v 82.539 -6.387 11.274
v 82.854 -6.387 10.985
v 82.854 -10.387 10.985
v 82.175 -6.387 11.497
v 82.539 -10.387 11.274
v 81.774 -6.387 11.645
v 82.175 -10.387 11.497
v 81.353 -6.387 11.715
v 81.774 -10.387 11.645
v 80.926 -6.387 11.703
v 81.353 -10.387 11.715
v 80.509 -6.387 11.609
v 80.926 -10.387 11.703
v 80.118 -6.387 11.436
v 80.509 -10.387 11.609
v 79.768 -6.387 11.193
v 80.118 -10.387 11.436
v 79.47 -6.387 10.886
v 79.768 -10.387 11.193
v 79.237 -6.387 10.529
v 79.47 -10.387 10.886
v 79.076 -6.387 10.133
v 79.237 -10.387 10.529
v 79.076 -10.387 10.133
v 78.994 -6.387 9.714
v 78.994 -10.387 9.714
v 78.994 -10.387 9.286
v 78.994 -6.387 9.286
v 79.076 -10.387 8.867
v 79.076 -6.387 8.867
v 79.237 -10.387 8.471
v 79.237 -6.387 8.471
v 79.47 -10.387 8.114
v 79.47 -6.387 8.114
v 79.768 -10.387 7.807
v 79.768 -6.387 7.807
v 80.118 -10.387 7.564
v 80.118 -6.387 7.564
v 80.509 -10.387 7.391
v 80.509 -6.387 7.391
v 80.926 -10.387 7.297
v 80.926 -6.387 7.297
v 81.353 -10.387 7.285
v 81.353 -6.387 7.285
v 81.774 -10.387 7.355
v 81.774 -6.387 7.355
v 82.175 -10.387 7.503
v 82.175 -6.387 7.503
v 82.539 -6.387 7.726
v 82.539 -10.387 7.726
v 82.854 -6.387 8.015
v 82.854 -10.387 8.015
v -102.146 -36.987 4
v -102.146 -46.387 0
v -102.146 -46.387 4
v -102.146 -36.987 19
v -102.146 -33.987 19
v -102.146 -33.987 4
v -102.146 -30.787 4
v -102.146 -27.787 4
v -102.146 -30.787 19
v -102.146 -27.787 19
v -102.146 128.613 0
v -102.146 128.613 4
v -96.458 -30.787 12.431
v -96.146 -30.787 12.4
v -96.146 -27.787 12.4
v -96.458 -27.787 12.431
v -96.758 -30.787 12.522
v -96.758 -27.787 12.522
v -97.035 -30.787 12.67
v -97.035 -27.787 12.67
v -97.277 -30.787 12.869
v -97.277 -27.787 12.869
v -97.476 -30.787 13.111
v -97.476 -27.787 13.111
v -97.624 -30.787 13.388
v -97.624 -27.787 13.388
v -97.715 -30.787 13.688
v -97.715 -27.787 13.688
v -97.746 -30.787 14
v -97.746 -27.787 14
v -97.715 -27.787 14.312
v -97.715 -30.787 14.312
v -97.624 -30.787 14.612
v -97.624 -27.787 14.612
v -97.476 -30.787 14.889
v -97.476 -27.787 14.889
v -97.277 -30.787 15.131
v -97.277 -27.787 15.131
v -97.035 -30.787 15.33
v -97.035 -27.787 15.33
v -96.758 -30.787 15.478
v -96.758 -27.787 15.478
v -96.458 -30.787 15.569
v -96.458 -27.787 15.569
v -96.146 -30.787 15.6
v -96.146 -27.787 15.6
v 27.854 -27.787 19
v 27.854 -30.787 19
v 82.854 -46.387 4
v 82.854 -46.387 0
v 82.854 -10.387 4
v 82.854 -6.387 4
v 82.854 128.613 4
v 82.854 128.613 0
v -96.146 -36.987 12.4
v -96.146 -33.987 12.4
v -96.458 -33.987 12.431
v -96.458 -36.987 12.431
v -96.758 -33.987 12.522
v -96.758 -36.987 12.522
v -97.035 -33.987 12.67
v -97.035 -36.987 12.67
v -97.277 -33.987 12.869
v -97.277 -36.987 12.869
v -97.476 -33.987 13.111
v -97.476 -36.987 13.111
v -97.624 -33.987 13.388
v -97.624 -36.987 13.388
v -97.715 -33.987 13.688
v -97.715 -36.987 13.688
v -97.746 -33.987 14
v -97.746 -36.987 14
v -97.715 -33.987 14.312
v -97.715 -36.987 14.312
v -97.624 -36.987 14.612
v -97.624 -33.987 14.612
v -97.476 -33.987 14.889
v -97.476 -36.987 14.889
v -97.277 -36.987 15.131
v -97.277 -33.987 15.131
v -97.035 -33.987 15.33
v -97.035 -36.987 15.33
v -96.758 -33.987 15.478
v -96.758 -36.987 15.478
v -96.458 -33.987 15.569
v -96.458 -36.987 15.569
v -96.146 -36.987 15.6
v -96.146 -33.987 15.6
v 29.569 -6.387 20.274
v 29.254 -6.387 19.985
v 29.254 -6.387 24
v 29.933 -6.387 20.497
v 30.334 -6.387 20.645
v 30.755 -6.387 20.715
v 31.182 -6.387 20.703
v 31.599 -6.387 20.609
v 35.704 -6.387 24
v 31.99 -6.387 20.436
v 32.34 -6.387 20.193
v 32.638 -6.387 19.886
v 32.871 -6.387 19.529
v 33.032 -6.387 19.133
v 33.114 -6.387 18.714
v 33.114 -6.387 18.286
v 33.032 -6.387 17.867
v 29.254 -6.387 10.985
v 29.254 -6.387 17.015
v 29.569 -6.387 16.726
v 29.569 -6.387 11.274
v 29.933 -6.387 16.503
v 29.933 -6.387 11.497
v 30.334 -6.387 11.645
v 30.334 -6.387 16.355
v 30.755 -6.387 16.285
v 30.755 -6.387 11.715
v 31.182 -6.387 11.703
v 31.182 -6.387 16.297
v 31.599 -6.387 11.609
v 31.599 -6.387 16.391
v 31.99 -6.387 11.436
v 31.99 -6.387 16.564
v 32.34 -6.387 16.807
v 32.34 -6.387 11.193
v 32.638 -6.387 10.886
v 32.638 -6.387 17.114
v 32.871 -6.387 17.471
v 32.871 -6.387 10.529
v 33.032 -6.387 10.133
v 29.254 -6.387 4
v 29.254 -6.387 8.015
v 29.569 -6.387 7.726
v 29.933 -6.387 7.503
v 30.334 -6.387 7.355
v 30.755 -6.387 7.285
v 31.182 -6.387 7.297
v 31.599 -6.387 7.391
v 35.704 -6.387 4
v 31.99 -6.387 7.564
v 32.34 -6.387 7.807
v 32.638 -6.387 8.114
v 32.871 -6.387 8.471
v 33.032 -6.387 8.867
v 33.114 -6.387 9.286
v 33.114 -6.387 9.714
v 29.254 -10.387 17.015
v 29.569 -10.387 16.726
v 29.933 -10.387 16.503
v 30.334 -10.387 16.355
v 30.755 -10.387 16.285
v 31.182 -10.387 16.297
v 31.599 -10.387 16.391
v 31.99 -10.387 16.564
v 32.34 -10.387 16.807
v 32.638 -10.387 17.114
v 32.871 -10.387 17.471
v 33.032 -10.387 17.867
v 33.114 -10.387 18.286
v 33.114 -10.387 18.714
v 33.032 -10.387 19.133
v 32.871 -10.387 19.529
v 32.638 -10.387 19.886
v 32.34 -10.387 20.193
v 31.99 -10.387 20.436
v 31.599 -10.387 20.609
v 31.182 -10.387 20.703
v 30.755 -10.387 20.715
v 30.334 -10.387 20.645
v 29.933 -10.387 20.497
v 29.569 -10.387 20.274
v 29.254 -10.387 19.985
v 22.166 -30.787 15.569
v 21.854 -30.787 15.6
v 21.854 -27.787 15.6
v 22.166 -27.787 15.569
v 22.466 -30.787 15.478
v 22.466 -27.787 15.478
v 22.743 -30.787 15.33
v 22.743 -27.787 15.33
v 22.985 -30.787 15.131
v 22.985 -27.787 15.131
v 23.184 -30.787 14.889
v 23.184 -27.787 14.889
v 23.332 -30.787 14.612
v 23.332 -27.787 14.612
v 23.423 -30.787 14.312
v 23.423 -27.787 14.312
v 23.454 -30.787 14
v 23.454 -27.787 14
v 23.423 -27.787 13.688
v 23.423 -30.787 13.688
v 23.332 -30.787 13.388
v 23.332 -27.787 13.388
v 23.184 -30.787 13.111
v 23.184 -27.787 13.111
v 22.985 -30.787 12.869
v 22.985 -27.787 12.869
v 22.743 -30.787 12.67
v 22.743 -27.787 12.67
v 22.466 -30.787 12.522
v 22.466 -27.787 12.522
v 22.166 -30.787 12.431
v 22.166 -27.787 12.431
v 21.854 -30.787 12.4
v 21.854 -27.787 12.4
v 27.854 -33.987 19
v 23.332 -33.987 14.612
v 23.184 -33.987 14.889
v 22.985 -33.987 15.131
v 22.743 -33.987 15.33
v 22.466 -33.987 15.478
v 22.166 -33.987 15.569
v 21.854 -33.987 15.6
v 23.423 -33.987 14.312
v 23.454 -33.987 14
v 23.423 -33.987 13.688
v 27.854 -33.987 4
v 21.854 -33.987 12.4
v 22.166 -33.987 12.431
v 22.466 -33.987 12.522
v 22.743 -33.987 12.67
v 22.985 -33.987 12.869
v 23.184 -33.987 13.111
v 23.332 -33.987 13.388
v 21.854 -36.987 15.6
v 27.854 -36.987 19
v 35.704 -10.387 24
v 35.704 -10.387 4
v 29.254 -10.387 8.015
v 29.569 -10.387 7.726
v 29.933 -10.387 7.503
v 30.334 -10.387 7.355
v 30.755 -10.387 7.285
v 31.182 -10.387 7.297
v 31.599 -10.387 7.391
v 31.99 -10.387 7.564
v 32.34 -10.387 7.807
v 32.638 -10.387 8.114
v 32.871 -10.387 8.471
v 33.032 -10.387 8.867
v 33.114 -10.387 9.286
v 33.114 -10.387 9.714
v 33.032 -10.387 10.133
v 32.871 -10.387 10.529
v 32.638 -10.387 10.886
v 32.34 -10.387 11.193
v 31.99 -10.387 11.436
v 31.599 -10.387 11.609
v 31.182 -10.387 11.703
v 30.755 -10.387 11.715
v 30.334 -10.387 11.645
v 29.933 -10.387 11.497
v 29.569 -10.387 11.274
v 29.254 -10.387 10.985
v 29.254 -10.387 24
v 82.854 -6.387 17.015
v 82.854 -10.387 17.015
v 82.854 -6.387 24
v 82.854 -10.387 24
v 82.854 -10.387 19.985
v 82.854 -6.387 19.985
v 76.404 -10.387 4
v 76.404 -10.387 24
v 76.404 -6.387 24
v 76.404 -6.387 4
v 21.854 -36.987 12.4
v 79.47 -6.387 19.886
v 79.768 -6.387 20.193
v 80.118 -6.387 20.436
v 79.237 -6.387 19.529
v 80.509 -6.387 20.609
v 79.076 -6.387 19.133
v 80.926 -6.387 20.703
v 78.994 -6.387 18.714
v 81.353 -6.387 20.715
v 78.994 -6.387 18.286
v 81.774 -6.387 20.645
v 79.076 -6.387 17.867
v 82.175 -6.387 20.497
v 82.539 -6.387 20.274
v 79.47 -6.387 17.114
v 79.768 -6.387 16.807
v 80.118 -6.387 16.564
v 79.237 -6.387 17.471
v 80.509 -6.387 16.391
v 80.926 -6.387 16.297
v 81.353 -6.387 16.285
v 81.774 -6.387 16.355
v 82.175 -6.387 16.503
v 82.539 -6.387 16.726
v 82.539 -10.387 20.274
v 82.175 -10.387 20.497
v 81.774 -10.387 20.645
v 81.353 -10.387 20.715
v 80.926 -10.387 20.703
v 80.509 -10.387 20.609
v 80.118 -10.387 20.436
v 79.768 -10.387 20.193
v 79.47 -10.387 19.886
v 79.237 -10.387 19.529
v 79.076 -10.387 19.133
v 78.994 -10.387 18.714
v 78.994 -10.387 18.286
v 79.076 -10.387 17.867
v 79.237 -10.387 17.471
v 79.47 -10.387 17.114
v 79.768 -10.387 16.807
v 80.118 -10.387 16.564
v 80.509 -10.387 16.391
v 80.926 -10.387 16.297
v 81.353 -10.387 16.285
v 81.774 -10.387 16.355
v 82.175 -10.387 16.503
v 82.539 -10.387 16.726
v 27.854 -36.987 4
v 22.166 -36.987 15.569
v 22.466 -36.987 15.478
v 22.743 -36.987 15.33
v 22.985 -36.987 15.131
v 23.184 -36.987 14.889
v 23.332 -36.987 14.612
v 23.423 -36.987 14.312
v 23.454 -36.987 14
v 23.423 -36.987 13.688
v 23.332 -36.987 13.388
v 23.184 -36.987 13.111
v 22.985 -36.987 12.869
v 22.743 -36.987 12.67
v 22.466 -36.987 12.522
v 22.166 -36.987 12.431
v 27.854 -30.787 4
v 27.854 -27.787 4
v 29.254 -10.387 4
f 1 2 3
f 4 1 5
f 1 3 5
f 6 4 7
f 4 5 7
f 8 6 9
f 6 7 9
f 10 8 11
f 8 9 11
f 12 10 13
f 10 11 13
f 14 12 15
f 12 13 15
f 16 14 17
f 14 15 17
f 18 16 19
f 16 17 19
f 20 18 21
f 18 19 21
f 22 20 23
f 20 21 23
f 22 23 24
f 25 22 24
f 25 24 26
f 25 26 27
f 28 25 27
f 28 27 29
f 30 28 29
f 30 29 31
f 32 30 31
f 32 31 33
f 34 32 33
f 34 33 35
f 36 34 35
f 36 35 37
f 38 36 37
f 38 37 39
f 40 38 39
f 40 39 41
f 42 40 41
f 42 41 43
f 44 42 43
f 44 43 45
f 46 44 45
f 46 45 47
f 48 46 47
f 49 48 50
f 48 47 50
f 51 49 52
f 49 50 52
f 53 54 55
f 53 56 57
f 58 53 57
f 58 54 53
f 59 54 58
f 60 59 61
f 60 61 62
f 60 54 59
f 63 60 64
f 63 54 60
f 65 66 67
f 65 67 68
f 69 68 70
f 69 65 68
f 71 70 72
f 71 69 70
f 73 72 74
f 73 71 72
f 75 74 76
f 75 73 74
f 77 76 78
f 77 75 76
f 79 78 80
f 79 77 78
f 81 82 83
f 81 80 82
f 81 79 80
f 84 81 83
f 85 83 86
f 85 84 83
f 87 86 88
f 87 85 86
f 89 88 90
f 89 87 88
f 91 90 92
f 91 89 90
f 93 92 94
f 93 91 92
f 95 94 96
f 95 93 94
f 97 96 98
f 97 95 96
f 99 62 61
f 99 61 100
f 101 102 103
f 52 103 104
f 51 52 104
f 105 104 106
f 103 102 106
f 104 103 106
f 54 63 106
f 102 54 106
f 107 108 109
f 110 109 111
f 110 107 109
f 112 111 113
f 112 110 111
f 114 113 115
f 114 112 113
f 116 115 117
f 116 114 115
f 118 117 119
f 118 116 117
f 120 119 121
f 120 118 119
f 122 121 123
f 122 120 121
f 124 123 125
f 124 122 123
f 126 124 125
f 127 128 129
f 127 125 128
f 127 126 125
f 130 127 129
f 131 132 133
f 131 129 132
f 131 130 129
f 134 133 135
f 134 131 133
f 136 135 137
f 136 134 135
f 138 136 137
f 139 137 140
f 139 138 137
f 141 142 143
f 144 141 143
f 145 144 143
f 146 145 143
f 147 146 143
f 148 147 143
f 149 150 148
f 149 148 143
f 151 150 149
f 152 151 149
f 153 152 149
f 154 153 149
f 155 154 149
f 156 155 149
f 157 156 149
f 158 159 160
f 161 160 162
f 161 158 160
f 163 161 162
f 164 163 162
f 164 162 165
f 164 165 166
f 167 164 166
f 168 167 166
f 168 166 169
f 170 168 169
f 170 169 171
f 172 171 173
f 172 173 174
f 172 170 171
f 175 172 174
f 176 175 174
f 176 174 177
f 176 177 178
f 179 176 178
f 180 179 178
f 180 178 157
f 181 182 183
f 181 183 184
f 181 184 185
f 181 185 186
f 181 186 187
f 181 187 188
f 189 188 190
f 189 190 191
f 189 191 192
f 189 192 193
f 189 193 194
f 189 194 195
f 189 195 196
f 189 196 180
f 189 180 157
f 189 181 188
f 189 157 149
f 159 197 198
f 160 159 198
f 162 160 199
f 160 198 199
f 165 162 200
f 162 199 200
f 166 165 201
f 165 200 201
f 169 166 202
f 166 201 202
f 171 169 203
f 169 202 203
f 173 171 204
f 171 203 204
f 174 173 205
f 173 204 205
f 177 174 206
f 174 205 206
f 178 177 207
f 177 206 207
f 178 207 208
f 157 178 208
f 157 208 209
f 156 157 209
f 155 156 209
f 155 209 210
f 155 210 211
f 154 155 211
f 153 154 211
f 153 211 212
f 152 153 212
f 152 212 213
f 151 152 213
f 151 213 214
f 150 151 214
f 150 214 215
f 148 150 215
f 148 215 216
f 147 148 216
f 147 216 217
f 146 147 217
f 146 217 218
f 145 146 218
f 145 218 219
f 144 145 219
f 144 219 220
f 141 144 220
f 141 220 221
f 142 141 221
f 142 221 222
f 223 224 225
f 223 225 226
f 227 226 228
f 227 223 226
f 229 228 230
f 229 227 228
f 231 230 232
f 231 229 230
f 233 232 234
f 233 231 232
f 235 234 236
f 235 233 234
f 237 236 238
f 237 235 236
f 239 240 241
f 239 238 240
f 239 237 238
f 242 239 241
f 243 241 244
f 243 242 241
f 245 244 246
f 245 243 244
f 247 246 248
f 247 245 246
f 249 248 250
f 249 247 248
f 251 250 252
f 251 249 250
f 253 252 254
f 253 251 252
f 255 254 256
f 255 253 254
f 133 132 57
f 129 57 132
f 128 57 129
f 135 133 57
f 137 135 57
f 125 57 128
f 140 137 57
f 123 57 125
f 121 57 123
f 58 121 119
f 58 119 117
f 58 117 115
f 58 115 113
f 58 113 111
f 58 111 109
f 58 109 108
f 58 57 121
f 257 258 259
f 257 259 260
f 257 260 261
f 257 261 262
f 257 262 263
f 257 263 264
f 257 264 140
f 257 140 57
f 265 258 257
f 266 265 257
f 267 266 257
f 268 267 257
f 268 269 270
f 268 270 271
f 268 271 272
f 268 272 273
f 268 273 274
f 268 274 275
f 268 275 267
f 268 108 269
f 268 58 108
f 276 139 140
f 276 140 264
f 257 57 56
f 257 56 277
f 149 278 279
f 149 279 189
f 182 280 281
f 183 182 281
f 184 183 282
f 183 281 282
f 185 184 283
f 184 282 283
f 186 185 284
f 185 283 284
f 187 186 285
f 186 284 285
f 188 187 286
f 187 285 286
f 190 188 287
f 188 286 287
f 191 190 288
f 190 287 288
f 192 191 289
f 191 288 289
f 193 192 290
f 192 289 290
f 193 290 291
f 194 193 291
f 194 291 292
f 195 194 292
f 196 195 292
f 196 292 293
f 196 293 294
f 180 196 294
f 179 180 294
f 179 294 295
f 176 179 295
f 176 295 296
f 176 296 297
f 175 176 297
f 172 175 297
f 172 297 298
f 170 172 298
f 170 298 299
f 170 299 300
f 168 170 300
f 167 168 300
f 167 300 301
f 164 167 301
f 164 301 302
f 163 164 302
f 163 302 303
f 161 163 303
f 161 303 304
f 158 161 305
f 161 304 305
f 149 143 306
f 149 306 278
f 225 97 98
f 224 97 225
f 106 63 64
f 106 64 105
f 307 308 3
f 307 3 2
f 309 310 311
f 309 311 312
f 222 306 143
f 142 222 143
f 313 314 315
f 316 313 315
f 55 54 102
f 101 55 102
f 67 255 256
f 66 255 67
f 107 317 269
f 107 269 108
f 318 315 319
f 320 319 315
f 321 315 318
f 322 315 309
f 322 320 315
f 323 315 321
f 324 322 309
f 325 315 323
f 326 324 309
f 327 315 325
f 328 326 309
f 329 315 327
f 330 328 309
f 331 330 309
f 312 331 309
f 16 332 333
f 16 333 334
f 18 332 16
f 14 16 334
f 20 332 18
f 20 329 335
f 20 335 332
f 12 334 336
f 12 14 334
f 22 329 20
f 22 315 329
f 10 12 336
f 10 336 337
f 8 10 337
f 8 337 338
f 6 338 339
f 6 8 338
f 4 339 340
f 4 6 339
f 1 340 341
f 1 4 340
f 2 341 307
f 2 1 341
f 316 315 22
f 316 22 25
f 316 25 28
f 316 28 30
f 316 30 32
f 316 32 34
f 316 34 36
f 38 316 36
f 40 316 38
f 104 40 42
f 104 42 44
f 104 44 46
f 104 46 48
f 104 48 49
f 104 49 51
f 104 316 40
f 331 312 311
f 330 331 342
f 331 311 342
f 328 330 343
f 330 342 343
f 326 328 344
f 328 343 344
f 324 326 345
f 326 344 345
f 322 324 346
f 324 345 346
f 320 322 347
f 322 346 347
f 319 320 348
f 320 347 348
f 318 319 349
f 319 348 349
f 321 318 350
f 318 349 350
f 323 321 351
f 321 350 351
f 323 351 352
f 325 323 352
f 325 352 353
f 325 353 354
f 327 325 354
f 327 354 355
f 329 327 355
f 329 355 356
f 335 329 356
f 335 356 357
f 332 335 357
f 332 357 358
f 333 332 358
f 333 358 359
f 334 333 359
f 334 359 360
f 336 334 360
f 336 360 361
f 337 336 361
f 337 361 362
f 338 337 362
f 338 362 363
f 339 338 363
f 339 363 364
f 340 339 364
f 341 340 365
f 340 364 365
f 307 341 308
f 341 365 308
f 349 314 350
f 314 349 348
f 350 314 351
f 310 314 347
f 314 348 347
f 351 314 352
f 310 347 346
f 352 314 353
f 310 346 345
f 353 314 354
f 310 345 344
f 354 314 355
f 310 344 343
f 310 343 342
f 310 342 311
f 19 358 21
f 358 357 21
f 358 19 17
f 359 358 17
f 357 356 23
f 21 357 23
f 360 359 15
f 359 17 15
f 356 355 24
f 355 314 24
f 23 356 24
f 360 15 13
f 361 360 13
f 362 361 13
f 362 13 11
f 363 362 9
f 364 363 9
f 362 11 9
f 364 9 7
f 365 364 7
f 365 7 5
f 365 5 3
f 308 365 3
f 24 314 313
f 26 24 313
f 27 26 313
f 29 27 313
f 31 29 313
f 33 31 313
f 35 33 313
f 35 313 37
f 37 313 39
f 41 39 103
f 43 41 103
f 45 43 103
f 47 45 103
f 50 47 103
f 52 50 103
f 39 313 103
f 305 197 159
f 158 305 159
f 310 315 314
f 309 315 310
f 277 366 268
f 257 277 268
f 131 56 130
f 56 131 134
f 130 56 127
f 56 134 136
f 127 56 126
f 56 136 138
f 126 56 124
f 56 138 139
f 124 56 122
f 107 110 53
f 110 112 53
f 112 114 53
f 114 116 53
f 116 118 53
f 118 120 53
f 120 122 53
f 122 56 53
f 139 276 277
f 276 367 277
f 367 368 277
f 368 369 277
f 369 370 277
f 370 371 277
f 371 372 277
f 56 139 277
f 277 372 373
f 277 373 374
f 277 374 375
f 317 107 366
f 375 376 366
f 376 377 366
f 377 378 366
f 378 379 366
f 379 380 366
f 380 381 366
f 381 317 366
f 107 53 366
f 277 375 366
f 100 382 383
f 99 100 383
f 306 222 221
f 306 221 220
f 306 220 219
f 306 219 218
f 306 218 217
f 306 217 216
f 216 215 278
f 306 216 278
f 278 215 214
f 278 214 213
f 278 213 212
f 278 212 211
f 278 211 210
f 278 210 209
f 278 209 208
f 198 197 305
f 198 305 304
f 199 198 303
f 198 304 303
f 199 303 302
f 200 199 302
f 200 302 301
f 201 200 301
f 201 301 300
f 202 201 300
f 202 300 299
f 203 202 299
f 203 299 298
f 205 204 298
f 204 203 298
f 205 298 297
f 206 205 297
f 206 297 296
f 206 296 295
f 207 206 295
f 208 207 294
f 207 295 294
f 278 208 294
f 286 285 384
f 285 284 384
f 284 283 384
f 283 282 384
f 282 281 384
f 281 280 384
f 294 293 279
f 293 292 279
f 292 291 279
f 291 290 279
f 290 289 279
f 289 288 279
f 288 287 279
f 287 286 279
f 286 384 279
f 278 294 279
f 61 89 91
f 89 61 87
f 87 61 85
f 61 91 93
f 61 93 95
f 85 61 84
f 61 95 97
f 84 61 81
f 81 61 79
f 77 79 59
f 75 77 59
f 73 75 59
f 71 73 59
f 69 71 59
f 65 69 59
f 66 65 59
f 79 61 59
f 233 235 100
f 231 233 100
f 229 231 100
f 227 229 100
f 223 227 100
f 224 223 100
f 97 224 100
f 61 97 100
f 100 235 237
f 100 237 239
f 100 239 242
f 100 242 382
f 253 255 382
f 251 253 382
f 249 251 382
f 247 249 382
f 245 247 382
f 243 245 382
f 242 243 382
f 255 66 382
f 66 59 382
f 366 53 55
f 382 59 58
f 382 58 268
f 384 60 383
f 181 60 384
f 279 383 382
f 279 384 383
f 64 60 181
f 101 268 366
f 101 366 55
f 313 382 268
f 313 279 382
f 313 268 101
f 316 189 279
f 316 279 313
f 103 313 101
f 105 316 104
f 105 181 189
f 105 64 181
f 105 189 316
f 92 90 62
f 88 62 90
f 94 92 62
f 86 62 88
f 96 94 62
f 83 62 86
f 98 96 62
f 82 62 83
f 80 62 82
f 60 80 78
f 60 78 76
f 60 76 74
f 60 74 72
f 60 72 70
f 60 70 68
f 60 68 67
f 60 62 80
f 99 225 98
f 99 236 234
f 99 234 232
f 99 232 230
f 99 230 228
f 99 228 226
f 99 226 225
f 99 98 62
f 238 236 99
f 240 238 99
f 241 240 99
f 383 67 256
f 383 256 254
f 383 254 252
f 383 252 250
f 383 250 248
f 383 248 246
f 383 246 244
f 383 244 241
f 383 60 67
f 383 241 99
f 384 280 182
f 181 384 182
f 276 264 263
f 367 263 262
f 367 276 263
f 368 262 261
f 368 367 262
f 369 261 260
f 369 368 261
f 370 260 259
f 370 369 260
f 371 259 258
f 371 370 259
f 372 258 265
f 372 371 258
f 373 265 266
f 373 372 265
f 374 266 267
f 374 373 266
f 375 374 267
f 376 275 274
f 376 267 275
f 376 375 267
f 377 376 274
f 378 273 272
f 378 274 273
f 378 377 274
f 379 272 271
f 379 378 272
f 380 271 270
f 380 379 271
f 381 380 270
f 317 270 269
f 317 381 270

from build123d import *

# Parameters (mm, degrees)
SKETCH_1_W          = 185
SKETCH_1_H          = 175
EXTRUDE_1_DEPTH     = 4
SKETCH_2_W          = 6.45
SKETCH_2_H          = 4
EXTRUDE_2_DEPTH     = 20
CUT_EXTRUDE_1_REACH = 176.157
SKETCH_3_R          = 2.22
SKETCH_4_W          = 130
SKETCH_4_H          = 3
EXTRUDE_3_DEPTH     = 15
CUT_EXTRUDE_2_REACH = 198.044


with BuildPart() as part:
    # 草圖1 → 填料-伸長1 (new body)
    with BuildSketch(Plane.XY):
        with Locations((-9.645986095, 41.11316568)):
            Rectangle(SKETCH_1_W, SKETCH_1_H)
    extrude(amount=EXTRUDE_1_DEPTH)

    # 草圖2 → 填料-伸長2 (add)
    with BuildSketch(Plane.XY.offset(4)):
        with Locations((79.629013905, -8.38683432)):
            Rectangle(SKETCH_2_W, SKETCH_2_H)
        with Locations((32.479013905, -8.38683432)):
            Rectangle(SKETCH_2_W, SKETCH_2_H)
    extrude(amount=EXTRUDE_2_DEPTH)

    # 草圖3 → 除料-伸長1 (cut, up to next)
    with BuildSketch(Plane.XZ.offset(10.38683432), mode=Mode.PRIVATE) as cut_extrude_1_sk1:
        with Locations((81.204013905, 18.5)):
            Circle(SKETCH_3_R)
    cut_extrude_1_tool1 = extrude(cut_extrude_1_sk1.sketch, amount=-CUT_EXTRUDE_1_REACH, mode=Mode.PRIVATE) & part.part
    # 草圖3 → 除料-伸長1 (cut, up to next)
    with BuildSketch(Plane.XZ.offset(10.38683432), mode=Mode.PRIVATE) as cut_extrude_1_sk2:
        with Locations((81.204013905, 9.5)):
            Circle(SKETCH_3_R)
    cut_extrude_1_tool2 = extrude(cut_extrude_1_sk2.sketch, amount=-CUT_EXTRUDE_1_REACH, mode=Mode.PRIVATE) & part.part
    # 草圖3 → 除料-伸長1 (cut, up to next)
    with BuildSketch(Plane.XZ.offset(10.38683432), mode=Mode.PRIVATE) as cut_extrude_1_sk3:
        with Locations((30.904013905, 9.5)):
            Circle(SKETCH_3_R)
    cut_extrude_1_tool3 = extrude(cut_extrude_1_sk3.sketch, amount=-CUT_EXTRUDE_1_REACH, mode=Mode.PRIVATE) & part.part
    # 草圖3 → 除料-伸長1 (cut, up to next)
    with BuildSketch(Plane.XZ.offset(10.38683432), mode=Mode.PRIVATE) as cut_extrude_1_sk4:
        with Locations((30.904013905, 18.5)):
            Circle(SKETCH_3_R)
    cut_extrude_1_tool4 = extrude(cut_extrude_1_sk4.sketch, amount=-CUT_EXTRUDE_1_REACH, mode=Mode.PRIVATE) & part.part
    add(cut_extrude_1_tool1.solids().sort_by_distance((81.204014, -10.386834, 18.5))[0], mode=Mode.SUBTRACT)
    add(cut_extrude_1_tool2.solids().sort_by_distance((81.204014, -10.386834, 9.5))[0], mode=Mode.SUBTRACT)
    add(cut_extrude_1_tool3.solids().sort_by_distance((30.904014, -10.386834, 9.5))[0], mode=Mode.SUBTRACT)
    add(cut_extrude_1_tool4.solids().sort_by_distance((30.904014, -10.386834, 18.5))[0], mode=Mode.SUBTRACT)

    # 草圖4 → 填料-伸長3 (add)
    with BuildSketch(Plane.XY.offset(4)):
        with Locations((-37.145986095, -29.28683432)):
            Rectangle(SKETCH_4_W, SKETCH_4_H)
        with Locations((-37.145986095, -35.48683432)):
            Rectangle(SKETCH_4_W, SKETCH_4_H)
    extrude(amount=EXTRUDE_3_DEPTH)

    # 除料-伸長2: up to this face of the body (flat: up to its plane)
    cut_extrude_2_end = Plane(part.part.faces().sort_by_distance((-37.145986095, -27.78683432, 11.5))[0])
    # 草圖5 → 除料-伸長2 (cut, up to the picked face)
    with BuildSketch(Plane.XZ.offset(36.98683432), mode=Mode.PRIVATE) as cut_extrude_2_sk1:
        with BuildLine():
            Line((-96.145986095, 15.6), (21.854013905, 15.6))
            ThreePointArc((21.854013905, 15.6), (23.454013905, 14), (21.854013905, 12.4))
            Line((21.854013905, 12.4), (-96.145986095, 12.4))
            ThreePointArc((-96.145986095, 12.4), (-97.745986095, 14), (-96.145986095, 15.6))
        make_face()
    cut_extrude_2_tool1 = split(extrude(cut_extrude_2_sk1.sketch, amount=-CUT_EXTRUDE_2_REACH, mode=Mode.PRIVATE), bisect_by=cut_extrude_2_end, keep=Keep.BOTH, mode=Mode.PRIVATE)
    add(cut_extrude_2_tool1.solids().sort_by(Axis((-37.145986, -36.986834, 14), (0, 1, 0)))[0], mode=Mode.SUBTRACT)


solid = part.part
